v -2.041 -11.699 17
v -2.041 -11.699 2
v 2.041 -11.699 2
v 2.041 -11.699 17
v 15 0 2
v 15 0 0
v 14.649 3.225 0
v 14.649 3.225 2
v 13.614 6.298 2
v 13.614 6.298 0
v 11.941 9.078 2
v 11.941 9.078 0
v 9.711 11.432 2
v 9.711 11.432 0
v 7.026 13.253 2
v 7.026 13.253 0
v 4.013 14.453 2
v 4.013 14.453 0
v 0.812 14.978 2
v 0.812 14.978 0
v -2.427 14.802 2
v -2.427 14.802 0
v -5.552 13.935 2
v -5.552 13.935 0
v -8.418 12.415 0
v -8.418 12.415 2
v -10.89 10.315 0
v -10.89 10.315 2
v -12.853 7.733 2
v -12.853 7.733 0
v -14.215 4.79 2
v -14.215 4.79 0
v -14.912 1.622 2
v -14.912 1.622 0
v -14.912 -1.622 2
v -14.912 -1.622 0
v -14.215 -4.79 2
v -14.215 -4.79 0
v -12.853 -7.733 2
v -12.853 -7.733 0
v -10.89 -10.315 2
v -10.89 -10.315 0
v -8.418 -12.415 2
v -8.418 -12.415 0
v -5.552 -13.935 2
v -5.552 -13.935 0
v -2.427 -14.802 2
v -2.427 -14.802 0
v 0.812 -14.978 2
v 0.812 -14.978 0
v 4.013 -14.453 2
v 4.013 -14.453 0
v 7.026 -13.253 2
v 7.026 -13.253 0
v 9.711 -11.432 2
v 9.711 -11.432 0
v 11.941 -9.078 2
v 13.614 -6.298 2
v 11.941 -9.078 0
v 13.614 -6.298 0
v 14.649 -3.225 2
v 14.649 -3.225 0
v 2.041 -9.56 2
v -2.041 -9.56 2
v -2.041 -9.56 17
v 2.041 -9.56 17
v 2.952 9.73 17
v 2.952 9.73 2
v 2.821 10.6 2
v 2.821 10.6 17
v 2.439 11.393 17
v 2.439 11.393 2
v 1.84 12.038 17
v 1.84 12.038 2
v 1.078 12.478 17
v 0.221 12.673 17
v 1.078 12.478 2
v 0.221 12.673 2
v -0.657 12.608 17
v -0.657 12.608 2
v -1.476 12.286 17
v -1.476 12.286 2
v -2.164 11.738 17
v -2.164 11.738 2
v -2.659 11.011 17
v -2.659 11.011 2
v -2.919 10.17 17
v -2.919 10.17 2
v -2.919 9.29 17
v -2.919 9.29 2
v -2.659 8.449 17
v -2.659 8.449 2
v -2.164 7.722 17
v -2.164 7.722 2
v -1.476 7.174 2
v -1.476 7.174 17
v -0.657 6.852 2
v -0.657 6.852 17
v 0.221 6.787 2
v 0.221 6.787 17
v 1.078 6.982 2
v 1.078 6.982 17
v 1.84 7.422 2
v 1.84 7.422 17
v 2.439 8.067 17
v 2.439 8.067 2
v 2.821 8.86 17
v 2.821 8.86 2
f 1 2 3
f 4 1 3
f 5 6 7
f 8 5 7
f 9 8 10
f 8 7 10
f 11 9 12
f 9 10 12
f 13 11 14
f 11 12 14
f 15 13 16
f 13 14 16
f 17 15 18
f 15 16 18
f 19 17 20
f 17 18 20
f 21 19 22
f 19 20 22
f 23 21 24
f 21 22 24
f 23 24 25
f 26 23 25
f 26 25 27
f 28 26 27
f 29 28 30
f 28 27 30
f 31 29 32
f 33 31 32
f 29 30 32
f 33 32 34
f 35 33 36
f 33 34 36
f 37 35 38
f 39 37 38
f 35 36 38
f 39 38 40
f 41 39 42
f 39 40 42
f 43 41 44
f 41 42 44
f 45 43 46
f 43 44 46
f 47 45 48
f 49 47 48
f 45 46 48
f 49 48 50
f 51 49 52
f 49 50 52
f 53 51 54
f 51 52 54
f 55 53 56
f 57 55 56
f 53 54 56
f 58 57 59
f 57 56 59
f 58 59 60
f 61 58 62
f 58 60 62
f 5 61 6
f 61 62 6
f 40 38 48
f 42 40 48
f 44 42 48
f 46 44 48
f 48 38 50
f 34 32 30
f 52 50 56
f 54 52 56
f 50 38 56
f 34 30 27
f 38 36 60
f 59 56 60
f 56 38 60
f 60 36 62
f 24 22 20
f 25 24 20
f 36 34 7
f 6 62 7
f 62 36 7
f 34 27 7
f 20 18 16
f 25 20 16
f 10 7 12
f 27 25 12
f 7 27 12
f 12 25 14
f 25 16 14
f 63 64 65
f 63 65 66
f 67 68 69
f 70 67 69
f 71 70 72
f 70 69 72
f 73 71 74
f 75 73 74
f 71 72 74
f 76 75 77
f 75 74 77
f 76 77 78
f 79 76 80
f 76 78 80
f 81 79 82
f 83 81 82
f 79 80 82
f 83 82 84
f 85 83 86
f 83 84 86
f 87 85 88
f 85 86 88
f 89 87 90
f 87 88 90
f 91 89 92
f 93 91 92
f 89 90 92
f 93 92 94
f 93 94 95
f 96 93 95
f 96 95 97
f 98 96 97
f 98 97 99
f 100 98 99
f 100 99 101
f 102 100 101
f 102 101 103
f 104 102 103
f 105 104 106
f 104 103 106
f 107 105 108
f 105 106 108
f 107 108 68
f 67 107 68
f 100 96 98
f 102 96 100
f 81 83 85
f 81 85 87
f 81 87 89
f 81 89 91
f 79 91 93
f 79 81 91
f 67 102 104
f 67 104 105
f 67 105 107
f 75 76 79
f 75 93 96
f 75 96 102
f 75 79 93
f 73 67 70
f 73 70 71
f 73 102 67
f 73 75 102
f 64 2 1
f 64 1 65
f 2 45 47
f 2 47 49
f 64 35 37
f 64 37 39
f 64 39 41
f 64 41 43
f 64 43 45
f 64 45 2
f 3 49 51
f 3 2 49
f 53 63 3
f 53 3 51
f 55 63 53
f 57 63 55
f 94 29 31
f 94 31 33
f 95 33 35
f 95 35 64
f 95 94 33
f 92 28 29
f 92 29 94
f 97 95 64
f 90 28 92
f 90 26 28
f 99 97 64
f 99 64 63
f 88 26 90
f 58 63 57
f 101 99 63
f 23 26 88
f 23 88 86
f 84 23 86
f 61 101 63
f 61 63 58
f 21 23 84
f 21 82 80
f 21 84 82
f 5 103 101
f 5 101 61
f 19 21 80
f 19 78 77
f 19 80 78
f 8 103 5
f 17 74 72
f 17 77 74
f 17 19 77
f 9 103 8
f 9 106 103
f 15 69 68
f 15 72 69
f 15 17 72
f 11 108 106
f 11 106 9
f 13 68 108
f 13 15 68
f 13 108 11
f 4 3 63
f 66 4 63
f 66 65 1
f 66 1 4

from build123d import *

# Parameters (mm, degrees)
F0_R     = 15
F1_DEPTH = 2
F2_R     = 2.9516544706
F2_W     = 4.0816161782
F2_H     = 2.1391976625
F3_DEPTH = 15


# Not quite as in the source:
# - a feature names something its author has since deleted; it is built from what else it names


with BuildPart() as f1:
    # F0 (on Top) → F1 (new body)
    with BuildSketch(Plane.XY):
        Circle(F0_R)
    extrude(amount=F1_DEPTH)

    # F2 (on face) → F3 (join)
    with BuildSketch(Plane.XY.offset(2)):
        with Locations((0, 9.7299581394)):
            Circle(F2_R)
        with Locations((0, -10.6295719743)):
            Rectangle(F2_W, F2_H)
    extrude(amount=F3_DEPTH)


solid = f1.part
